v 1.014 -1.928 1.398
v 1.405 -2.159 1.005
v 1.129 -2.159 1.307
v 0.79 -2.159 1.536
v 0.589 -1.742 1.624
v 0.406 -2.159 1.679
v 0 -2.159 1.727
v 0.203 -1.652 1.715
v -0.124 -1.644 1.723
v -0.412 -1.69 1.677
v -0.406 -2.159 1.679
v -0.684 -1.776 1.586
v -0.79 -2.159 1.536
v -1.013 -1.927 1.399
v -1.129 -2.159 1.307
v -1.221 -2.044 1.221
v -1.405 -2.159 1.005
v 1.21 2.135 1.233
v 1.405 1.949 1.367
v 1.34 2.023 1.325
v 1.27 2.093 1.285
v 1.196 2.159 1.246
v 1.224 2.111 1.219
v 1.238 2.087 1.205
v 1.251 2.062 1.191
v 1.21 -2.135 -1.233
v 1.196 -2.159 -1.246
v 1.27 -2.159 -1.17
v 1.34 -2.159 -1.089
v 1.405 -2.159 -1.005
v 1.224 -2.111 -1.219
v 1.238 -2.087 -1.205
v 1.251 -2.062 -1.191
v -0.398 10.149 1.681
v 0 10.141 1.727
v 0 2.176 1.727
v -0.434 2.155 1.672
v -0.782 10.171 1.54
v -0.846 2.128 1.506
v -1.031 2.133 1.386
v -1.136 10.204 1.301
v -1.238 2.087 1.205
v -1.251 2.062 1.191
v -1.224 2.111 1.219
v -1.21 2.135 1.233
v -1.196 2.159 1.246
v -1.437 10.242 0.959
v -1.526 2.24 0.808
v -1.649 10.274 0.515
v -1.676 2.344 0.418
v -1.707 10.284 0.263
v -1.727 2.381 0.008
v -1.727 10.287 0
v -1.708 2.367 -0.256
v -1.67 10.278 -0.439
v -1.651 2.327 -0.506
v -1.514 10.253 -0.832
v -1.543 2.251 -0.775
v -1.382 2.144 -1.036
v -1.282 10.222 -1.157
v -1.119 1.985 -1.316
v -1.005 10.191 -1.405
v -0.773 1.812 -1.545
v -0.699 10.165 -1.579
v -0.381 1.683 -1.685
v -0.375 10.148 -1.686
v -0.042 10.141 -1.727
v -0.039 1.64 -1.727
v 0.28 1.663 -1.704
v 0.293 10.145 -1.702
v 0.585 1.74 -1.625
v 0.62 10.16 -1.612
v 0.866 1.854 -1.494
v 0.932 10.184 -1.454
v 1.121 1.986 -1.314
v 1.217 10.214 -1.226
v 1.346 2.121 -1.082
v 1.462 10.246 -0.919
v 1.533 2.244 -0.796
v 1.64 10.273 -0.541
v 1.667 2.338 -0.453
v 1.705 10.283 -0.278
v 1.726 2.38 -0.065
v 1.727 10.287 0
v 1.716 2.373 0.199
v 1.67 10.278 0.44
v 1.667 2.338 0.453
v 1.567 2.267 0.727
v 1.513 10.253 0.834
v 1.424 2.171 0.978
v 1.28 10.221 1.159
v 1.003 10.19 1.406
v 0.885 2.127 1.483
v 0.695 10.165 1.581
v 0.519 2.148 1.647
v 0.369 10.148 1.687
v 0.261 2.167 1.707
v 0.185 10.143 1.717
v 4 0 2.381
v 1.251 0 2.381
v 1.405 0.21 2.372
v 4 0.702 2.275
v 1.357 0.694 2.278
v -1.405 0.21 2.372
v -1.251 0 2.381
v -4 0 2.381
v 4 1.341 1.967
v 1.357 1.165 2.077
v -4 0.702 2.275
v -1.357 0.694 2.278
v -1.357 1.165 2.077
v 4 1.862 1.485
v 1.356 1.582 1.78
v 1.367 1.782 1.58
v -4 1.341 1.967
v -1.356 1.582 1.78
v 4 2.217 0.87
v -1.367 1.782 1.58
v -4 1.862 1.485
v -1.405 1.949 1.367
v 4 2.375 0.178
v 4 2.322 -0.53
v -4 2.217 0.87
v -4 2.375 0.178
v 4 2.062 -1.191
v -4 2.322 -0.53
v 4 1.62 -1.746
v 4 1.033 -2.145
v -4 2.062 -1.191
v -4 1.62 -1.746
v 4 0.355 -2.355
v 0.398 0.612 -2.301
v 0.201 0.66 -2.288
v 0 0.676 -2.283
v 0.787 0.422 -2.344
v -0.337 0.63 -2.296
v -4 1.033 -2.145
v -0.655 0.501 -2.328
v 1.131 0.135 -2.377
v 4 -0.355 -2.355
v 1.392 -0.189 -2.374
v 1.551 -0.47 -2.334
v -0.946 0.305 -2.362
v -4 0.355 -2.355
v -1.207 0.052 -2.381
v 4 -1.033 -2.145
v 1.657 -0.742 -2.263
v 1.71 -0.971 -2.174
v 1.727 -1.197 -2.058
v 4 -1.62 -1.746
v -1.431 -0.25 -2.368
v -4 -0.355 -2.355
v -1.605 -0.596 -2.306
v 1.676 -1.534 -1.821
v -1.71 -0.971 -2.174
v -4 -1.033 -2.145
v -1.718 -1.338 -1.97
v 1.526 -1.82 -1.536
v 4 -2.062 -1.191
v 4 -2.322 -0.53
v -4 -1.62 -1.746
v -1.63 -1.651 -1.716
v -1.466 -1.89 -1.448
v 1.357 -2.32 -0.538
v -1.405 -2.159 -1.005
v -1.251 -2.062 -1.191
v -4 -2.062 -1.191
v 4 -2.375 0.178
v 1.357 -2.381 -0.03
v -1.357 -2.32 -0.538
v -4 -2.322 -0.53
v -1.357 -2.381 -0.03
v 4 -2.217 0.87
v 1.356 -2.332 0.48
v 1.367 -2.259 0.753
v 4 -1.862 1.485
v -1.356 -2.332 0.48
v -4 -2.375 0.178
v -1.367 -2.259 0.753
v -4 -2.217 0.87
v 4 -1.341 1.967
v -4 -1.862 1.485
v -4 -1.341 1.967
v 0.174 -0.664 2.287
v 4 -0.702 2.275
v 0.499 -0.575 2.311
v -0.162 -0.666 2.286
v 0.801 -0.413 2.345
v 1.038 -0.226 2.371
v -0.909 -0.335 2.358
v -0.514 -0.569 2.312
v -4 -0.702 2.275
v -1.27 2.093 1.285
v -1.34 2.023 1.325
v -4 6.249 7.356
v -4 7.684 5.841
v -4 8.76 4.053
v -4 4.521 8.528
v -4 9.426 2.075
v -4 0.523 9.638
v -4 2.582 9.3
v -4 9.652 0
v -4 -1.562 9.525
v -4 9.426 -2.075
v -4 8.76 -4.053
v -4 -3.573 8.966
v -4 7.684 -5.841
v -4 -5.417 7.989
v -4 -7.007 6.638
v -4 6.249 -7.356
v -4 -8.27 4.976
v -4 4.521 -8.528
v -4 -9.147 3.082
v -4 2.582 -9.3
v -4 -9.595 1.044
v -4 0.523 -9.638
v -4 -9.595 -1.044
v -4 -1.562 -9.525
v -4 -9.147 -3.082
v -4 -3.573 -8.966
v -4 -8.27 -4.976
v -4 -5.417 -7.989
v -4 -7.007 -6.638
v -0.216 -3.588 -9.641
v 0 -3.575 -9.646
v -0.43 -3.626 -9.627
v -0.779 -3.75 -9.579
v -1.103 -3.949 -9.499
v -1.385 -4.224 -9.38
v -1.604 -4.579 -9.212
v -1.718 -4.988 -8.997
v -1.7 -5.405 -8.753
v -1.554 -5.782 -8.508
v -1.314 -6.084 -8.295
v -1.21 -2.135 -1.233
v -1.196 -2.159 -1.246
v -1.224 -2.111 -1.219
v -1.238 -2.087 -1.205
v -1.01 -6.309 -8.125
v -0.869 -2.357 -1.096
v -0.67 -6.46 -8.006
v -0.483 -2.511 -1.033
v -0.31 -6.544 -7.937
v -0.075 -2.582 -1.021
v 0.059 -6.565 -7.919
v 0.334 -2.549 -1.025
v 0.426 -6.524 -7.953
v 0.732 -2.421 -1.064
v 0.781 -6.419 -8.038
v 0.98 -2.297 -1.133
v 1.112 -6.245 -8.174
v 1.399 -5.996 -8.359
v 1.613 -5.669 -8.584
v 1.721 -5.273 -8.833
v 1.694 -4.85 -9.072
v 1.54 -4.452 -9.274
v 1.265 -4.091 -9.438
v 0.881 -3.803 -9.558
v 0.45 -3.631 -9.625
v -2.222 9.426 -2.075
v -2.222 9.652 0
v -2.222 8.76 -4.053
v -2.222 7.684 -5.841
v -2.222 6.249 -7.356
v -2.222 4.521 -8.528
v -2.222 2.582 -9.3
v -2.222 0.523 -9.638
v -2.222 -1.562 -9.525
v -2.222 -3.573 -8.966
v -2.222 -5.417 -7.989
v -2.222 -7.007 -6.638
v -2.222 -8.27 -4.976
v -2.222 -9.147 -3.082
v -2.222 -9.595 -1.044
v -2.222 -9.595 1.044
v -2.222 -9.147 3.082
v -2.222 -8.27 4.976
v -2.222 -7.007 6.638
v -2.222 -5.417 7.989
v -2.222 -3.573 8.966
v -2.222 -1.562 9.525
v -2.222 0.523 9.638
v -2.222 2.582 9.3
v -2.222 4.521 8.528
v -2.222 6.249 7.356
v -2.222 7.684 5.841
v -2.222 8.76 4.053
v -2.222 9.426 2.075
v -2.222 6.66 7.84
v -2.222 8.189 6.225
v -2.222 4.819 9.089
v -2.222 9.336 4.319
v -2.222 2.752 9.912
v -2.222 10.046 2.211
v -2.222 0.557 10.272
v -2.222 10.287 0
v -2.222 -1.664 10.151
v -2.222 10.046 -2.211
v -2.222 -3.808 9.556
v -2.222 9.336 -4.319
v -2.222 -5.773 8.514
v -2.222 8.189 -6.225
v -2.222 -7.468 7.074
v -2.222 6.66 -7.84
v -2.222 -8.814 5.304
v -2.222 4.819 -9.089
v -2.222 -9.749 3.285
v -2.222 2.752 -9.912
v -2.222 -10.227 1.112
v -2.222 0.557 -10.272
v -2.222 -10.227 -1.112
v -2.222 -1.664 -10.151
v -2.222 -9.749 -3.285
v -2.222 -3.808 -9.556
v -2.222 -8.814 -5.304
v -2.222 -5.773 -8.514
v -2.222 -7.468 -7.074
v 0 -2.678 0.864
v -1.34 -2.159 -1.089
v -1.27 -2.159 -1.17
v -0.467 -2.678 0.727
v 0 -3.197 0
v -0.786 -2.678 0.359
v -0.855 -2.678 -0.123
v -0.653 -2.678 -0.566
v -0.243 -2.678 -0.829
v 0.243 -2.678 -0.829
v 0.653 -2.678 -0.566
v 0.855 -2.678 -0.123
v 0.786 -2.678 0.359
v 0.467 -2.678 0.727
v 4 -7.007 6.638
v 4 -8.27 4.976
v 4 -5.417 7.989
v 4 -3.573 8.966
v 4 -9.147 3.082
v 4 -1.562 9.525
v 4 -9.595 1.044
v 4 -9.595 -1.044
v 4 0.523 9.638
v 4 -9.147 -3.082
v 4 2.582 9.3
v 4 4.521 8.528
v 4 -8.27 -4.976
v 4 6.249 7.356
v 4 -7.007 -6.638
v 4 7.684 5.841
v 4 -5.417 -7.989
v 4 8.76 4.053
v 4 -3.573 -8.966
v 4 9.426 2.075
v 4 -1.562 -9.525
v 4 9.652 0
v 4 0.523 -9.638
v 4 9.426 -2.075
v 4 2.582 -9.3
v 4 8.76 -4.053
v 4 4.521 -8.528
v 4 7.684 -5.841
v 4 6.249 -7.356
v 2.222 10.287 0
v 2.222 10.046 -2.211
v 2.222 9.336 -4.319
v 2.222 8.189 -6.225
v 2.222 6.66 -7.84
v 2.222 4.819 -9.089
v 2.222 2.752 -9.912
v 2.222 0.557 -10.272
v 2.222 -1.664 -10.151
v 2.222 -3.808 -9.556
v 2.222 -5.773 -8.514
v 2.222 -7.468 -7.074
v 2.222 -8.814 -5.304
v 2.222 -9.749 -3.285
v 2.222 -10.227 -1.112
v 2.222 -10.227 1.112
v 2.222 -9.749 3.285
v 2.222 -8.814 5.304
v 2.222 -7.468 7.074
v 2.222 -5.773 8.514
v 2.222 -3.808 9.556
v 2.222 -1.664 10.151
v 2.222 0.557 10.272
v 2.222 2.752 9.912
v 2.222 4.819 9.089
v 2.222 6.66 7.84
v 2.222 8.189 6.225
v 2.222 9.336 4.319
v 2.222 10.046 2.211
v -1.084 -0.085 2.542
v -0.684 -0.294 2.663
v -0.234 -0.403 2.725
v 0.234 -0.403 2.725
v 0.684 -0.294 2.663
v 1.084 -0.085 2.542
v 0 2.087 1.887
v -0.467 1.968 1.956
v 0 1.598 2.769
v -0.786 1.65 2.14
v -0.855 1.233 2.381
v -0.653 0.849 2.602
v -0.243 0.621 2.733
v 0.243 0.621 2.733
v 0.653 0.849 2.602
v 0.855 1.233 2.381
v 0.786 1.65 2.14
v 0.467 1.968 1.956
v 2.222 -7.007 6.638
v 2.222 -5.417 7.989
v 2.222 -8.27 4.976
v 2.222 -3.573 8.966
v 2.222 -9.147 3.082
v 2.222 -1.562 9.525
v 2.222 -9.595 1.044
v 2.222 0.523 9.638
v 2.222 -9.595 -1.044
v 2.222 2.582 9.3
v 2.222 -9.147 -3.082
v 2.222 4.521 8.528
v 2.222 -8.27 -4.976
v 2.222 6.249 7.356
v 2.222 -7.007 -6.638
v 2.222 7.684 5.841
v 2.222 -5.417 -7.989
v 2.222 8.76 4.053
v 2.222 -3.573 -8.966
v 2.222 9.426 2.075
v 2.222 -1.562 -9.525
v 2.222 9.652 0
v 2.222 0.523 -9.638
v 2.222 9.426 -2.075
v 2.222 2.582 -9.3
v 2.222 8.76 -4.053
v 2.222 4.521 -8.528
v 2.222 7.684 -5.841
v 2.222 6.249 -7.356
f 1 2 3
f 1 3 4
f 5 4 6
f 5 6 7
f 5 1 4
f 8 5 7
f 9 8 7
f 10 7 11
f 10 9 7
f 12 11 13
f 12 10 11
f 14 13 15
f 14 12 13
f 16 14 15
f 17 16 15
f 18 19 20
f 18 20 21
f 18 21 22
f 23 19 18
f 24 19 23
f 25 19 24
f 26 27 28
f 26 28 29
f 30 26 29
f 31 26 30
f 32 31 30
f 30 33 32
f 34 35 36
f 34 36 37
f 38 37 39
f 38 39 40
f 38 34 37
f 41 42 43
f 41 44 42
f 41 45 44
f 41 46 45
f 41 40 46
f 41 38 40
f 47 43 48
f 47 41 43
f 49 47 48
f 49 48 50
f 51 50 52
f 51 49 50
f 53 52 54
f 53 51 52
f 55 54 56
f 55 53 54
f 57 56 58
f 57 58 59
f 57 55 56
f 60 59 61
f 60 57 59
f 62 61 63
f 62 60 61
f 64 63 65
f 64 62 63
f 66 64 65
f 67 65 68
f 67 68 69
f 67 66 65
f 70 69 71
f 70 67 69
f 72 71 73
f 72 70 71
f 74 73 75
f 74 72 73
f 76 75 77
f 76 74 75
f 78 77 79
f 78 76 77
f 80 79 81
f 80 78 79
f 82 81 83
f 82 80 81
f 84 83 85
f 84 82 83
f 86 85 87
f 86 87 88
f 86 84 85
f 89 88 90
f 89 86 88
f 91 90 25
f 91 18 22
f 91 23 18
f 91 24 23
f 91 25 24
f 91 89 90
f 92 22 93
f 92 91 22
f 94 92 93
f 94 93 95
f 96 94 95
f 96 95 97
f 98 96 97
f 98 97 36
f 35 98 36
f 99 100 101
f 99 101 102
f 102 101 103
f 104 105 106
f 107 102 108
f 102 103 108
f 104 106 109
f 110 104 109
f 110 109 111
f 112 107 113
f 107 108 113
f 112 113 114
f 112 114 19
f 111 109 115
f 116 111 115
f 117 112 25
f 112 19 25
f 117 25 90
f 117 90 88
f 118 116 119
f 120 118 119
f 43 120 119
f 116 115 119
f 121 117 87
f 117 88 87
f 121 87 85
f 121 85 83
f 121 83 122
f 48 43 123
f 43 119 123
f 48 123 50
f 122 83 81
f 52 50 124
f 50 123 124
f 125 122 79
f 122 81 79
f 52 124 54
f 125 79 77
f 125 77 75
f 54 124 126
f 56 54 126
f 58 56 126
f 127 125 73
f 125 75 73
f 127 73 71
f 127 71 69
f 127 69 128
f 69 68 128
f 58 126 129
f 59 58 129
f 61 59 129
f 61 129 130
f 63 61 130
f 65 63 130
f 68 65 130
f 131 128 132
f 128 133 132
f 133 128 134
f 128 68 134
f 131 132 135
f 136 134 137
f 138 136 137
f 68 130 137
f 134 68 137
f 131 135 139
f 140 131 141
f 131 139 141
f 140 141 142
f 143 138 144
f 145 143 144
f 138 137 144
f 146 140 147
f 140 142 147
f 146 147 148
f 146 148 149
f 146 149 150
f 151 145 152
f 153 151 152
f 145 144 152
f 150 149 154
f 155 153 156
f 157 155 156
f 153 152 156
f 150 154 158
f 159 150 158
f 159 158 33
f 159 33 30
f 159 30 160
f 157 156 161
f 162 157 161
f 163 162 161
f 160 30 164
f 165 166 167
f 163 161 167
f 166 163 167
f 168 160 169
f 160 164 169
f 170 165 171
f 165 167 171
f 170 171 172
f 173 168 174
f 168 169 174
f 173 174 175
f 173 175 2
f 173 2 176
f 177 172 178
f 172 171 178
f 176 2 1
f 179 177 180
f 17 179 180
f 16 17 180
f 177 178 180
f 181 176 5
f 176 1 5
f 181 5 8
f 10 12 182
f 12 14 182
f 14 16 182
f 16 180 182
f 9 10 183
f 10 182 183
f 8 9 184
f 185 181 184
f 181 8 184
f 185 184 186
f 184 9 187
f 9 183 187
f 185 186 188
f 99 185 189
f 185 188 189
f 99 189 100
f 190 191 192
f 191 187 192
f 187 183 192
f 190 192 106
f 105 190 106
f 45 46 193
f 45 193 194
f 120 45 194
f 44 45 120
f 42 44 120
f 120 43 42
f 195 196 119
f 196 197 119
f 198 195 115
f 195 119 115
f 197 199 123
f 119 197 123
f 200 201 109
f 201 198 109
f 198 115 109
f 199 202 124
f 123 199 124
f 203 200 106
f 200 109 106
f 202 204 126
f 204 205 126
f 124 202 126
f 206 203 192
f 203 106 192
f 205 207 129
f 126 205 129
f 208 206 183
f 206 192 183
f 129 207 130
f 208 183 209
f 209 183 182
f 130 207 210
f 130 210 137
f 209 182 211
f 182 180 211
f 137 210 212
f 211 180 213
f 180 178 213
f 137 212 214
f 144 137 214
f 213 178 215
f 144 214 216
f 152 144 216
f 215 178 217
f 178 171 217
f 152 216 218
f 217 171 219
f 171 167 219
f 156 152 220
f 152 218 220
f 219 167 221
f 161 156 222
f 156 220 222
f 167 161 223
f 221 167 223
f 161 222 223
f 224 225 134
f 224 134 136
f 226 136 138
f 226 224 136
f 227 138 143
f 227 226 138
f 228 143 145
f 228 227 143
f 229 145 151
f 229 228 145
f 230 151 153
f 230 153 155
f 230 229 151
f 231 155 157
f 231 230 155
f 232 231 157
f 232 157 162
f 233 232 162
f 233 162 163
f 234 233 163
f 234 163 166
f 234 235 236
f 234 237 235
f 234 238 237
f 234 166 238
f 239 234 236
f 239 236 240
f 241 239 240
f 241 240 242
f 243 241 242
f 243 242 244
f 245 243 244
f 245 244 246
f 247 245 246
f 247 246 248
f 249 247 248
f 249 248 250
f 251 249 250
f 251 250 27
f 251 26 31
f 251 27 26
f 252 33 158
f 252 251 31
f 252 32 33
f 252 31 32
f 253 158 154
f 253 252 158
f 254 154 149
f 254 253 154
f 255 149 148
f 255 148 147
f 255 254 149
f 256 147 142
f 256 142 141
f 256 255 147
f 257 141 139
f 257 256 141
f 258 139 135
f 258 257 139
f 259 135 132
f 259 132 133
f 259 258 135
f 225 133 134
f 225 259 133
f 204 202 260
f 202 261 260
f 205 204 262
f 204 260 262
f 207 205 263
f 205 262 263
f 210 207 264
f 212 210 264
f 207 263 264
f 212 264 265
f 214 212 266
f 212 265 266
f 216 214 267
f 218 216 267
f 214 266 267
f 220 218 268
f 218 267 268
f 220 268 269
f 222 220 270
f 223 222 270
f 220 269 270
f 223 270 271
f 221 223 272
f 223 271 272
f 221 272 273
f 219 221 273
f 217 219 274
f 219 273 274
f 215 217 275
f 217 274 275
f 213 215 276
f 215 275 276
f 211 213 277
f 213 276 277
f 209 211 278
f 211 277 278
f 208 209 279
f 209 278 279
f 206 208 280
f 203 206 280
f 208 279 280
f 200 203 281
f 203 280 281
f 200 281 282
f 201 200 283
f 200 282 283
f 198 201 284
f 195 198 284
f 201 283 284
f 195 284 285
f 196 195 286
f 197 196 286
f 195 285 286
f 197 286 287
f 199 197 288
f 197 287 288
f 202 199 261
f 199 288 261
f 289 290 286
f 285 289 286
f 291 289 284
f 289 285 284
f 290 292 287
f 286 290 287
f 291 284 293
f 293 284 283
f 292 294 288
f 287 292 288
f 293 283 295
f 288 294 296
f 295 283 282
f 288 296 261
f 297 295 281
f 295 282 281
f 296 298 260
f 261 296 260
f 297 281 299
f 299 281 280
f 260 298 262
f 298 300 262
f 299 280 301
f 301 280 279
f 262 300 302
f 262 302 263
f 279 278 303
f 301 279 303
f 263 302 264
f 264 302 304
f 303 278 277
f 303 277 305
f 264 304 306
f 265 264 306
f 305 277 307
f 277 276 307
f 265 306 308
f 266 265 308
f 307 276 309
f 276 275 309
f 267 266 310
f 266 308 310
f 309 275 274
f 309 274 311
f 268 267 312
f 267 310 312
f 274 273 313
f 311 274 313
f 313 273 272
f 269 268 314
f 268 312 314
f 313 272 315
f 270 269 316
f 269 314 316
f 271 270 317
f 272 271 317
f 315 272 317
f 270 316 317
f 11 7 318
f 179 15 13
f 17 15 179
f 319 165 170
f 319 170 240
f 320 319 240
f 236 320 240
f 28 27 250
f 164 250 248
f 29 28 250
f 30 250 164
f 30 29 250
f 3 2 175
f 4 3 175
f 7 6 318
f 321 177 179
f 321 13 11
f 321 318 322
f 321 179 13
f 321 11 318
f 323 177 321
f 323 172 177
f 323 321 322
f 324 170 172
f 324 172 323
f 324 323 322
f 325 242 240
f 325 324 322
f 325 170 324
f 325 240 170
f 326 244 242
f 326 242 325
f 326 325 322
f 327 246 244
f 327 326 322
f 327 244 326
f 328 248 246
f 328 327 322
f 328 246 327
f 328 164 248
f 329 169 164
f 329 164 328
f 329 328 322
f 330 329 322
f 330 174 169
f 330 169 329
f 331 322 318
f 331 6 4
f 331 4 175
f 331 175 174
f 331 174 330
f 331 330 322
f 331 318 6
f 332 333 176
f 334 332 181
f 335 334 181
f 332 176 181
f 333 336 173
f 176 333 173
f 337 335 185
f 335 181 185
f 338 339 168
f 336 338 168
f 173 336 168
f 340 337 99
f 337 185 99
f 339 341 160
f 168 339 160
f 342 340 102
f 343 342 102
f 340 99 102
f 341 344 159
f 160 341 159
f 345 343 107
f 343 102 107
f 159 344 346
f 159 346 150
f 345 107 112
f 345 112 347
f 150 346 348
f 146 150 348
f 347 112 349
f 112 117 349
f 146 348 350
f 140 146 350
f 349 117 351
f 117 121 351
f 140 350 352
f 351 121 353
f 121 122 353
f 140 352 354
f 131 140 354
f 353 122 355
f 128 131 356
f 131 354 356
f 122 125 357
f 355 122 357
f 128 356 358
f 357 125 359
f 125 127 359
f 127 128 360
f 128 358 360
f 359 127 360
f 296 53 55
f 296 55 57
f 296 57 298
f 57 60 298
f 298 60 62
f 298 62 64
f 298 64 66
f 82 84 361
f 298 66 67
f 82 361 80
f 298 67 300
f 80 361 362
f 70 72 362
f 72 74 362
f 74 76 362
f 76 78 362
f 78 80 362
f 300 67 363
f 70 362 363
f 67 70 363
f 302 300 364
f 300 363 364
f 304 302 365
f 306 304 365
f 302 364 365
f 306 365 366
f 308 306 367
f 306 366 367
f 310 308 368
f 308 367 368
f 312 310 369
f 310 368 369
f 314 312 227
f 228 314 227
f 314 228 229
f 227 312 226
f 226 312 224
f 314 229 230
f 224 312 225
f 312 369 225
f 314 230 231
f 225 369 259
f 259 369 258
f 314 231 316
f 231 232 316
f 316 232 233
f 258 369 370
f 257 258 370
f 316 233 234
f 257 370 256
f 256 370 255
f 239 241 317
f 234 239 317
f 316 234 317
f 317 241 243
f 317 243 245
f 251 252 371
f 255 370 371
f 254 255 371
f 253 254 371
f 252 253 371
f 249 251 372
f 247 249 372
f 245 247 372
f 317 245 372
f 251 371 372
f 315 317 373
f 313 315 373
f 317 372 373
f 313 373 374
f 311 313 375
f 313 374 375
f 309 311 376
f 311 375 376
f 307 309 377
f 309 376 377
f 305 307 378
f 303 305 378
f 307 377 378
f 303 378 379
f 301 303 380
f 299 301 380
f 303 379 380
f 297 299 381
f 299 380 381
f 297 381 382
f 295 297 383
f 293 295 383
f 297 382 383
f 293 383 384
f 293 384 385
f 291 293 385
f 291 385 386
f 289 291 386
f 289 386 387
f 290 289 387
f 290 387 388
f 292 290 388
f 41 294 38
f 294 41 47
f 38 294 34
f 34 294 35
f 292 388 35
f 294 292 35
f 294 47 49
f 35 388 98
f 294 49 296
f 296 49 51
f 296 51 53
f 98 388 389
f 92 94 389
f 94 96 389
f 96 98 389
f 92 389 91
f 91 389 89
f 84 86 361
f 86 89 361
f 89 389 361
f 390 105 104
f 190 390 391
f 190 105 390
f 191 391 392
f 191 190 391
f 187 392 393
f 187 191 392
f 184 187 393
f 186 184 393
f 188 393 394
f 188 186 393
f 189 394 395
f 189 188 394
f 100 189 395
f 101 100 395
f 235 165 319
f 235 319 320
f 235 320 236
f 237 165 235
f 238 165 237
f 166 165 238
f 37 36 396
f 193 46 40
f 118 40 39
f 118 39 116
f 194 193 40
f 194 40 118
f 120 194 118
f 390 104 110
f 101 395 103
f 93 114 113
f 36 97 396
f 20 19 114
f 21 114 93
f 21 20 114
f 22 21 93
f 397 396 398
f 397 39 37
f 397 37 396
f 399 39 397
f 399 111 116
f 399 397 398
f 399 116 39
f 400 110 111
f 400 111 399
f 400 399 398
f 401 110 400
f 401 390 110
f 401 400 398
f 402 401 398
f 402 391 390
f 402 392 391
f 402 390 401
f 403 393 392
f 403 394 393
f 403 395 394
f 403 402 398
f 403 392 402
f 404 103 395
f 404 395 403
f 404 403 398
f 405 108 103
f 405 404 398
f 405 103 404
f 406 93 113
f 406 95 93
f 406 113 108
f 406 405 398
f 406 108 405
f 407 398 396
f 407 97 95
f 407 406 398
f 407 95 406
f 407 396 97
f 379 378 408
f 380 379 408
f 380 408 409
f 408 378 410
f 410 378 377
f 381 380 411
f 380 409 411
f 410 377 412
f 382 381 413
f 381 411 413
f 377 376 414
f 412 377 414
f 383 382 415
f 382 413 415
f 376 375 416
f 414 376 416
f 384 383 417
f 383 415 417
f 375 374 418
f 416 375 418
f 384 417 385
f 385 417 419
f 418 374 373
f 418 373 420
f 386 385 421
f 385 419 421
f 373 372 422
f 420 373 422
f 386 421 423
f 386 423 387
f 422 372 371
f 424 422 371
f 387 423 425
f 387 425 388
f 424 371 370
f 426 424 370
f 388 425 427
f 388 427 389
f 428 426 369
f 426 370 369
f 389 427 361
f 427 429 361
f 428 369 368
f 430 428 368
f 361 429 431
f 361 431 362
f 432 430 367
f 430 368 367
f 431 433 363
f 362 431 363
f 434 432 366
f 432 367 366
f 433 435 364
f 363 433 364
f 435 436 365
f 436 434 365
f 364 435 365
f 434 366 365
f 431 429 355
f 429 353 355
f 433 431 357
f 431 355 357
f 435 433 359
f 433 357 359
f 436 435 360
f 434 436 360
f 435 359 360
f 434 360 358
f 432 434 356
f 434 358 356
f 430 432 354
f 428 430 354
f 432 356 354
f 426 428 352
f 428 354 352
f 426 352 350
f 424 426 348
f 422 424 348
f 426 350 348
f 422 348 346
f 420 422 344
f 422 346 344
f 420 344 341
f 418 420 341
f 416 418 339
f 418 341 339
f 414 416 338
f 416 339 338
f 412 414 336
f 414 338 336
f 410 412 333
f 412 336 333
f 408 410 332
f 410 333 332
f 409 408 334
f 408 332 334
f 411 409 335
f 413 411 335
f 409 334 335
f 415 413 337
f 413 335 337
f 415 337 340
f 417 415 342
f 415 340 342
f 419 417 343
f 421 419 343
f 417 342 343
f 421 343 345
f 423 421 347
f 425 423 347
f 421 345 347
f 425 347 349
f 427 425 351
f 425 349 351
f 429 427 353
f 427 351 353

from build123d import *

# Parameters (mm, degrees)
SKETCH2_R          = 2.38125
CUT_EXTRUDE1_DEPTH = 9
CIRPATTERN1_COUNT  = 2
CIRPATTERN1_ANGLE  = 120


with BuildPart() as part:
    # Sketch1 → Revolve1 (revolve)
    with BuildSketch(Plane.XY):
        Polygon((4, 0), (-4, 0), (-4, 9.652), (-2.222, 9.652), (-2.222, 10.287), (2.222, 10.287), (2.222, 9.652), (4, 9.652), align=None)
    revolve(axis=Axis((8.430806561, 0, 0), (-1, 0, 0)))

    # Sketch2 → Cut-Extrude1 (cut, through all)
    with BuildSketch(Plane.ZY.offset(4)):
        Circle(SKETCH2_R)
    extrude(amount=-CUT_EXTRUDE1_DEPTH, mode=Mode.SUBTRACT)

    # Sketch4 → #8-32 Tapped Hole1 (revolve, cut)
    with BuildSketch(Plane(origin=(0, 10.287, 0), x_dir=(0, 0, 1), z_dir=(1, 0, 0))):
        Polygon((0, 0), (0, 13.483806461), (1.7272, 12.446), (1.7272, 0), align=None)
    f_8_32_tapped_hole1 = revolve(axis=Axis((0, 16.637, 0), (0, -1, 0)), mode=Mode.SUBTRACT)

    # CirPattern1: #8-32 Tapped Hole1 ×2 about axis
    cirpattern1_axis = Axis((4, 0, 0), (-1, 0, 0))
    for i in range(1, CIRPATTERN1_COUNT):
        add(f_8_32_tapped_hole1.rotate(cirpattern1_axis, i * CIRPATTERN1_ANGLE / (CIRPATTERN1_COUNT - 1)), mode=Mode.SUBTRACT)


solid = part.part
